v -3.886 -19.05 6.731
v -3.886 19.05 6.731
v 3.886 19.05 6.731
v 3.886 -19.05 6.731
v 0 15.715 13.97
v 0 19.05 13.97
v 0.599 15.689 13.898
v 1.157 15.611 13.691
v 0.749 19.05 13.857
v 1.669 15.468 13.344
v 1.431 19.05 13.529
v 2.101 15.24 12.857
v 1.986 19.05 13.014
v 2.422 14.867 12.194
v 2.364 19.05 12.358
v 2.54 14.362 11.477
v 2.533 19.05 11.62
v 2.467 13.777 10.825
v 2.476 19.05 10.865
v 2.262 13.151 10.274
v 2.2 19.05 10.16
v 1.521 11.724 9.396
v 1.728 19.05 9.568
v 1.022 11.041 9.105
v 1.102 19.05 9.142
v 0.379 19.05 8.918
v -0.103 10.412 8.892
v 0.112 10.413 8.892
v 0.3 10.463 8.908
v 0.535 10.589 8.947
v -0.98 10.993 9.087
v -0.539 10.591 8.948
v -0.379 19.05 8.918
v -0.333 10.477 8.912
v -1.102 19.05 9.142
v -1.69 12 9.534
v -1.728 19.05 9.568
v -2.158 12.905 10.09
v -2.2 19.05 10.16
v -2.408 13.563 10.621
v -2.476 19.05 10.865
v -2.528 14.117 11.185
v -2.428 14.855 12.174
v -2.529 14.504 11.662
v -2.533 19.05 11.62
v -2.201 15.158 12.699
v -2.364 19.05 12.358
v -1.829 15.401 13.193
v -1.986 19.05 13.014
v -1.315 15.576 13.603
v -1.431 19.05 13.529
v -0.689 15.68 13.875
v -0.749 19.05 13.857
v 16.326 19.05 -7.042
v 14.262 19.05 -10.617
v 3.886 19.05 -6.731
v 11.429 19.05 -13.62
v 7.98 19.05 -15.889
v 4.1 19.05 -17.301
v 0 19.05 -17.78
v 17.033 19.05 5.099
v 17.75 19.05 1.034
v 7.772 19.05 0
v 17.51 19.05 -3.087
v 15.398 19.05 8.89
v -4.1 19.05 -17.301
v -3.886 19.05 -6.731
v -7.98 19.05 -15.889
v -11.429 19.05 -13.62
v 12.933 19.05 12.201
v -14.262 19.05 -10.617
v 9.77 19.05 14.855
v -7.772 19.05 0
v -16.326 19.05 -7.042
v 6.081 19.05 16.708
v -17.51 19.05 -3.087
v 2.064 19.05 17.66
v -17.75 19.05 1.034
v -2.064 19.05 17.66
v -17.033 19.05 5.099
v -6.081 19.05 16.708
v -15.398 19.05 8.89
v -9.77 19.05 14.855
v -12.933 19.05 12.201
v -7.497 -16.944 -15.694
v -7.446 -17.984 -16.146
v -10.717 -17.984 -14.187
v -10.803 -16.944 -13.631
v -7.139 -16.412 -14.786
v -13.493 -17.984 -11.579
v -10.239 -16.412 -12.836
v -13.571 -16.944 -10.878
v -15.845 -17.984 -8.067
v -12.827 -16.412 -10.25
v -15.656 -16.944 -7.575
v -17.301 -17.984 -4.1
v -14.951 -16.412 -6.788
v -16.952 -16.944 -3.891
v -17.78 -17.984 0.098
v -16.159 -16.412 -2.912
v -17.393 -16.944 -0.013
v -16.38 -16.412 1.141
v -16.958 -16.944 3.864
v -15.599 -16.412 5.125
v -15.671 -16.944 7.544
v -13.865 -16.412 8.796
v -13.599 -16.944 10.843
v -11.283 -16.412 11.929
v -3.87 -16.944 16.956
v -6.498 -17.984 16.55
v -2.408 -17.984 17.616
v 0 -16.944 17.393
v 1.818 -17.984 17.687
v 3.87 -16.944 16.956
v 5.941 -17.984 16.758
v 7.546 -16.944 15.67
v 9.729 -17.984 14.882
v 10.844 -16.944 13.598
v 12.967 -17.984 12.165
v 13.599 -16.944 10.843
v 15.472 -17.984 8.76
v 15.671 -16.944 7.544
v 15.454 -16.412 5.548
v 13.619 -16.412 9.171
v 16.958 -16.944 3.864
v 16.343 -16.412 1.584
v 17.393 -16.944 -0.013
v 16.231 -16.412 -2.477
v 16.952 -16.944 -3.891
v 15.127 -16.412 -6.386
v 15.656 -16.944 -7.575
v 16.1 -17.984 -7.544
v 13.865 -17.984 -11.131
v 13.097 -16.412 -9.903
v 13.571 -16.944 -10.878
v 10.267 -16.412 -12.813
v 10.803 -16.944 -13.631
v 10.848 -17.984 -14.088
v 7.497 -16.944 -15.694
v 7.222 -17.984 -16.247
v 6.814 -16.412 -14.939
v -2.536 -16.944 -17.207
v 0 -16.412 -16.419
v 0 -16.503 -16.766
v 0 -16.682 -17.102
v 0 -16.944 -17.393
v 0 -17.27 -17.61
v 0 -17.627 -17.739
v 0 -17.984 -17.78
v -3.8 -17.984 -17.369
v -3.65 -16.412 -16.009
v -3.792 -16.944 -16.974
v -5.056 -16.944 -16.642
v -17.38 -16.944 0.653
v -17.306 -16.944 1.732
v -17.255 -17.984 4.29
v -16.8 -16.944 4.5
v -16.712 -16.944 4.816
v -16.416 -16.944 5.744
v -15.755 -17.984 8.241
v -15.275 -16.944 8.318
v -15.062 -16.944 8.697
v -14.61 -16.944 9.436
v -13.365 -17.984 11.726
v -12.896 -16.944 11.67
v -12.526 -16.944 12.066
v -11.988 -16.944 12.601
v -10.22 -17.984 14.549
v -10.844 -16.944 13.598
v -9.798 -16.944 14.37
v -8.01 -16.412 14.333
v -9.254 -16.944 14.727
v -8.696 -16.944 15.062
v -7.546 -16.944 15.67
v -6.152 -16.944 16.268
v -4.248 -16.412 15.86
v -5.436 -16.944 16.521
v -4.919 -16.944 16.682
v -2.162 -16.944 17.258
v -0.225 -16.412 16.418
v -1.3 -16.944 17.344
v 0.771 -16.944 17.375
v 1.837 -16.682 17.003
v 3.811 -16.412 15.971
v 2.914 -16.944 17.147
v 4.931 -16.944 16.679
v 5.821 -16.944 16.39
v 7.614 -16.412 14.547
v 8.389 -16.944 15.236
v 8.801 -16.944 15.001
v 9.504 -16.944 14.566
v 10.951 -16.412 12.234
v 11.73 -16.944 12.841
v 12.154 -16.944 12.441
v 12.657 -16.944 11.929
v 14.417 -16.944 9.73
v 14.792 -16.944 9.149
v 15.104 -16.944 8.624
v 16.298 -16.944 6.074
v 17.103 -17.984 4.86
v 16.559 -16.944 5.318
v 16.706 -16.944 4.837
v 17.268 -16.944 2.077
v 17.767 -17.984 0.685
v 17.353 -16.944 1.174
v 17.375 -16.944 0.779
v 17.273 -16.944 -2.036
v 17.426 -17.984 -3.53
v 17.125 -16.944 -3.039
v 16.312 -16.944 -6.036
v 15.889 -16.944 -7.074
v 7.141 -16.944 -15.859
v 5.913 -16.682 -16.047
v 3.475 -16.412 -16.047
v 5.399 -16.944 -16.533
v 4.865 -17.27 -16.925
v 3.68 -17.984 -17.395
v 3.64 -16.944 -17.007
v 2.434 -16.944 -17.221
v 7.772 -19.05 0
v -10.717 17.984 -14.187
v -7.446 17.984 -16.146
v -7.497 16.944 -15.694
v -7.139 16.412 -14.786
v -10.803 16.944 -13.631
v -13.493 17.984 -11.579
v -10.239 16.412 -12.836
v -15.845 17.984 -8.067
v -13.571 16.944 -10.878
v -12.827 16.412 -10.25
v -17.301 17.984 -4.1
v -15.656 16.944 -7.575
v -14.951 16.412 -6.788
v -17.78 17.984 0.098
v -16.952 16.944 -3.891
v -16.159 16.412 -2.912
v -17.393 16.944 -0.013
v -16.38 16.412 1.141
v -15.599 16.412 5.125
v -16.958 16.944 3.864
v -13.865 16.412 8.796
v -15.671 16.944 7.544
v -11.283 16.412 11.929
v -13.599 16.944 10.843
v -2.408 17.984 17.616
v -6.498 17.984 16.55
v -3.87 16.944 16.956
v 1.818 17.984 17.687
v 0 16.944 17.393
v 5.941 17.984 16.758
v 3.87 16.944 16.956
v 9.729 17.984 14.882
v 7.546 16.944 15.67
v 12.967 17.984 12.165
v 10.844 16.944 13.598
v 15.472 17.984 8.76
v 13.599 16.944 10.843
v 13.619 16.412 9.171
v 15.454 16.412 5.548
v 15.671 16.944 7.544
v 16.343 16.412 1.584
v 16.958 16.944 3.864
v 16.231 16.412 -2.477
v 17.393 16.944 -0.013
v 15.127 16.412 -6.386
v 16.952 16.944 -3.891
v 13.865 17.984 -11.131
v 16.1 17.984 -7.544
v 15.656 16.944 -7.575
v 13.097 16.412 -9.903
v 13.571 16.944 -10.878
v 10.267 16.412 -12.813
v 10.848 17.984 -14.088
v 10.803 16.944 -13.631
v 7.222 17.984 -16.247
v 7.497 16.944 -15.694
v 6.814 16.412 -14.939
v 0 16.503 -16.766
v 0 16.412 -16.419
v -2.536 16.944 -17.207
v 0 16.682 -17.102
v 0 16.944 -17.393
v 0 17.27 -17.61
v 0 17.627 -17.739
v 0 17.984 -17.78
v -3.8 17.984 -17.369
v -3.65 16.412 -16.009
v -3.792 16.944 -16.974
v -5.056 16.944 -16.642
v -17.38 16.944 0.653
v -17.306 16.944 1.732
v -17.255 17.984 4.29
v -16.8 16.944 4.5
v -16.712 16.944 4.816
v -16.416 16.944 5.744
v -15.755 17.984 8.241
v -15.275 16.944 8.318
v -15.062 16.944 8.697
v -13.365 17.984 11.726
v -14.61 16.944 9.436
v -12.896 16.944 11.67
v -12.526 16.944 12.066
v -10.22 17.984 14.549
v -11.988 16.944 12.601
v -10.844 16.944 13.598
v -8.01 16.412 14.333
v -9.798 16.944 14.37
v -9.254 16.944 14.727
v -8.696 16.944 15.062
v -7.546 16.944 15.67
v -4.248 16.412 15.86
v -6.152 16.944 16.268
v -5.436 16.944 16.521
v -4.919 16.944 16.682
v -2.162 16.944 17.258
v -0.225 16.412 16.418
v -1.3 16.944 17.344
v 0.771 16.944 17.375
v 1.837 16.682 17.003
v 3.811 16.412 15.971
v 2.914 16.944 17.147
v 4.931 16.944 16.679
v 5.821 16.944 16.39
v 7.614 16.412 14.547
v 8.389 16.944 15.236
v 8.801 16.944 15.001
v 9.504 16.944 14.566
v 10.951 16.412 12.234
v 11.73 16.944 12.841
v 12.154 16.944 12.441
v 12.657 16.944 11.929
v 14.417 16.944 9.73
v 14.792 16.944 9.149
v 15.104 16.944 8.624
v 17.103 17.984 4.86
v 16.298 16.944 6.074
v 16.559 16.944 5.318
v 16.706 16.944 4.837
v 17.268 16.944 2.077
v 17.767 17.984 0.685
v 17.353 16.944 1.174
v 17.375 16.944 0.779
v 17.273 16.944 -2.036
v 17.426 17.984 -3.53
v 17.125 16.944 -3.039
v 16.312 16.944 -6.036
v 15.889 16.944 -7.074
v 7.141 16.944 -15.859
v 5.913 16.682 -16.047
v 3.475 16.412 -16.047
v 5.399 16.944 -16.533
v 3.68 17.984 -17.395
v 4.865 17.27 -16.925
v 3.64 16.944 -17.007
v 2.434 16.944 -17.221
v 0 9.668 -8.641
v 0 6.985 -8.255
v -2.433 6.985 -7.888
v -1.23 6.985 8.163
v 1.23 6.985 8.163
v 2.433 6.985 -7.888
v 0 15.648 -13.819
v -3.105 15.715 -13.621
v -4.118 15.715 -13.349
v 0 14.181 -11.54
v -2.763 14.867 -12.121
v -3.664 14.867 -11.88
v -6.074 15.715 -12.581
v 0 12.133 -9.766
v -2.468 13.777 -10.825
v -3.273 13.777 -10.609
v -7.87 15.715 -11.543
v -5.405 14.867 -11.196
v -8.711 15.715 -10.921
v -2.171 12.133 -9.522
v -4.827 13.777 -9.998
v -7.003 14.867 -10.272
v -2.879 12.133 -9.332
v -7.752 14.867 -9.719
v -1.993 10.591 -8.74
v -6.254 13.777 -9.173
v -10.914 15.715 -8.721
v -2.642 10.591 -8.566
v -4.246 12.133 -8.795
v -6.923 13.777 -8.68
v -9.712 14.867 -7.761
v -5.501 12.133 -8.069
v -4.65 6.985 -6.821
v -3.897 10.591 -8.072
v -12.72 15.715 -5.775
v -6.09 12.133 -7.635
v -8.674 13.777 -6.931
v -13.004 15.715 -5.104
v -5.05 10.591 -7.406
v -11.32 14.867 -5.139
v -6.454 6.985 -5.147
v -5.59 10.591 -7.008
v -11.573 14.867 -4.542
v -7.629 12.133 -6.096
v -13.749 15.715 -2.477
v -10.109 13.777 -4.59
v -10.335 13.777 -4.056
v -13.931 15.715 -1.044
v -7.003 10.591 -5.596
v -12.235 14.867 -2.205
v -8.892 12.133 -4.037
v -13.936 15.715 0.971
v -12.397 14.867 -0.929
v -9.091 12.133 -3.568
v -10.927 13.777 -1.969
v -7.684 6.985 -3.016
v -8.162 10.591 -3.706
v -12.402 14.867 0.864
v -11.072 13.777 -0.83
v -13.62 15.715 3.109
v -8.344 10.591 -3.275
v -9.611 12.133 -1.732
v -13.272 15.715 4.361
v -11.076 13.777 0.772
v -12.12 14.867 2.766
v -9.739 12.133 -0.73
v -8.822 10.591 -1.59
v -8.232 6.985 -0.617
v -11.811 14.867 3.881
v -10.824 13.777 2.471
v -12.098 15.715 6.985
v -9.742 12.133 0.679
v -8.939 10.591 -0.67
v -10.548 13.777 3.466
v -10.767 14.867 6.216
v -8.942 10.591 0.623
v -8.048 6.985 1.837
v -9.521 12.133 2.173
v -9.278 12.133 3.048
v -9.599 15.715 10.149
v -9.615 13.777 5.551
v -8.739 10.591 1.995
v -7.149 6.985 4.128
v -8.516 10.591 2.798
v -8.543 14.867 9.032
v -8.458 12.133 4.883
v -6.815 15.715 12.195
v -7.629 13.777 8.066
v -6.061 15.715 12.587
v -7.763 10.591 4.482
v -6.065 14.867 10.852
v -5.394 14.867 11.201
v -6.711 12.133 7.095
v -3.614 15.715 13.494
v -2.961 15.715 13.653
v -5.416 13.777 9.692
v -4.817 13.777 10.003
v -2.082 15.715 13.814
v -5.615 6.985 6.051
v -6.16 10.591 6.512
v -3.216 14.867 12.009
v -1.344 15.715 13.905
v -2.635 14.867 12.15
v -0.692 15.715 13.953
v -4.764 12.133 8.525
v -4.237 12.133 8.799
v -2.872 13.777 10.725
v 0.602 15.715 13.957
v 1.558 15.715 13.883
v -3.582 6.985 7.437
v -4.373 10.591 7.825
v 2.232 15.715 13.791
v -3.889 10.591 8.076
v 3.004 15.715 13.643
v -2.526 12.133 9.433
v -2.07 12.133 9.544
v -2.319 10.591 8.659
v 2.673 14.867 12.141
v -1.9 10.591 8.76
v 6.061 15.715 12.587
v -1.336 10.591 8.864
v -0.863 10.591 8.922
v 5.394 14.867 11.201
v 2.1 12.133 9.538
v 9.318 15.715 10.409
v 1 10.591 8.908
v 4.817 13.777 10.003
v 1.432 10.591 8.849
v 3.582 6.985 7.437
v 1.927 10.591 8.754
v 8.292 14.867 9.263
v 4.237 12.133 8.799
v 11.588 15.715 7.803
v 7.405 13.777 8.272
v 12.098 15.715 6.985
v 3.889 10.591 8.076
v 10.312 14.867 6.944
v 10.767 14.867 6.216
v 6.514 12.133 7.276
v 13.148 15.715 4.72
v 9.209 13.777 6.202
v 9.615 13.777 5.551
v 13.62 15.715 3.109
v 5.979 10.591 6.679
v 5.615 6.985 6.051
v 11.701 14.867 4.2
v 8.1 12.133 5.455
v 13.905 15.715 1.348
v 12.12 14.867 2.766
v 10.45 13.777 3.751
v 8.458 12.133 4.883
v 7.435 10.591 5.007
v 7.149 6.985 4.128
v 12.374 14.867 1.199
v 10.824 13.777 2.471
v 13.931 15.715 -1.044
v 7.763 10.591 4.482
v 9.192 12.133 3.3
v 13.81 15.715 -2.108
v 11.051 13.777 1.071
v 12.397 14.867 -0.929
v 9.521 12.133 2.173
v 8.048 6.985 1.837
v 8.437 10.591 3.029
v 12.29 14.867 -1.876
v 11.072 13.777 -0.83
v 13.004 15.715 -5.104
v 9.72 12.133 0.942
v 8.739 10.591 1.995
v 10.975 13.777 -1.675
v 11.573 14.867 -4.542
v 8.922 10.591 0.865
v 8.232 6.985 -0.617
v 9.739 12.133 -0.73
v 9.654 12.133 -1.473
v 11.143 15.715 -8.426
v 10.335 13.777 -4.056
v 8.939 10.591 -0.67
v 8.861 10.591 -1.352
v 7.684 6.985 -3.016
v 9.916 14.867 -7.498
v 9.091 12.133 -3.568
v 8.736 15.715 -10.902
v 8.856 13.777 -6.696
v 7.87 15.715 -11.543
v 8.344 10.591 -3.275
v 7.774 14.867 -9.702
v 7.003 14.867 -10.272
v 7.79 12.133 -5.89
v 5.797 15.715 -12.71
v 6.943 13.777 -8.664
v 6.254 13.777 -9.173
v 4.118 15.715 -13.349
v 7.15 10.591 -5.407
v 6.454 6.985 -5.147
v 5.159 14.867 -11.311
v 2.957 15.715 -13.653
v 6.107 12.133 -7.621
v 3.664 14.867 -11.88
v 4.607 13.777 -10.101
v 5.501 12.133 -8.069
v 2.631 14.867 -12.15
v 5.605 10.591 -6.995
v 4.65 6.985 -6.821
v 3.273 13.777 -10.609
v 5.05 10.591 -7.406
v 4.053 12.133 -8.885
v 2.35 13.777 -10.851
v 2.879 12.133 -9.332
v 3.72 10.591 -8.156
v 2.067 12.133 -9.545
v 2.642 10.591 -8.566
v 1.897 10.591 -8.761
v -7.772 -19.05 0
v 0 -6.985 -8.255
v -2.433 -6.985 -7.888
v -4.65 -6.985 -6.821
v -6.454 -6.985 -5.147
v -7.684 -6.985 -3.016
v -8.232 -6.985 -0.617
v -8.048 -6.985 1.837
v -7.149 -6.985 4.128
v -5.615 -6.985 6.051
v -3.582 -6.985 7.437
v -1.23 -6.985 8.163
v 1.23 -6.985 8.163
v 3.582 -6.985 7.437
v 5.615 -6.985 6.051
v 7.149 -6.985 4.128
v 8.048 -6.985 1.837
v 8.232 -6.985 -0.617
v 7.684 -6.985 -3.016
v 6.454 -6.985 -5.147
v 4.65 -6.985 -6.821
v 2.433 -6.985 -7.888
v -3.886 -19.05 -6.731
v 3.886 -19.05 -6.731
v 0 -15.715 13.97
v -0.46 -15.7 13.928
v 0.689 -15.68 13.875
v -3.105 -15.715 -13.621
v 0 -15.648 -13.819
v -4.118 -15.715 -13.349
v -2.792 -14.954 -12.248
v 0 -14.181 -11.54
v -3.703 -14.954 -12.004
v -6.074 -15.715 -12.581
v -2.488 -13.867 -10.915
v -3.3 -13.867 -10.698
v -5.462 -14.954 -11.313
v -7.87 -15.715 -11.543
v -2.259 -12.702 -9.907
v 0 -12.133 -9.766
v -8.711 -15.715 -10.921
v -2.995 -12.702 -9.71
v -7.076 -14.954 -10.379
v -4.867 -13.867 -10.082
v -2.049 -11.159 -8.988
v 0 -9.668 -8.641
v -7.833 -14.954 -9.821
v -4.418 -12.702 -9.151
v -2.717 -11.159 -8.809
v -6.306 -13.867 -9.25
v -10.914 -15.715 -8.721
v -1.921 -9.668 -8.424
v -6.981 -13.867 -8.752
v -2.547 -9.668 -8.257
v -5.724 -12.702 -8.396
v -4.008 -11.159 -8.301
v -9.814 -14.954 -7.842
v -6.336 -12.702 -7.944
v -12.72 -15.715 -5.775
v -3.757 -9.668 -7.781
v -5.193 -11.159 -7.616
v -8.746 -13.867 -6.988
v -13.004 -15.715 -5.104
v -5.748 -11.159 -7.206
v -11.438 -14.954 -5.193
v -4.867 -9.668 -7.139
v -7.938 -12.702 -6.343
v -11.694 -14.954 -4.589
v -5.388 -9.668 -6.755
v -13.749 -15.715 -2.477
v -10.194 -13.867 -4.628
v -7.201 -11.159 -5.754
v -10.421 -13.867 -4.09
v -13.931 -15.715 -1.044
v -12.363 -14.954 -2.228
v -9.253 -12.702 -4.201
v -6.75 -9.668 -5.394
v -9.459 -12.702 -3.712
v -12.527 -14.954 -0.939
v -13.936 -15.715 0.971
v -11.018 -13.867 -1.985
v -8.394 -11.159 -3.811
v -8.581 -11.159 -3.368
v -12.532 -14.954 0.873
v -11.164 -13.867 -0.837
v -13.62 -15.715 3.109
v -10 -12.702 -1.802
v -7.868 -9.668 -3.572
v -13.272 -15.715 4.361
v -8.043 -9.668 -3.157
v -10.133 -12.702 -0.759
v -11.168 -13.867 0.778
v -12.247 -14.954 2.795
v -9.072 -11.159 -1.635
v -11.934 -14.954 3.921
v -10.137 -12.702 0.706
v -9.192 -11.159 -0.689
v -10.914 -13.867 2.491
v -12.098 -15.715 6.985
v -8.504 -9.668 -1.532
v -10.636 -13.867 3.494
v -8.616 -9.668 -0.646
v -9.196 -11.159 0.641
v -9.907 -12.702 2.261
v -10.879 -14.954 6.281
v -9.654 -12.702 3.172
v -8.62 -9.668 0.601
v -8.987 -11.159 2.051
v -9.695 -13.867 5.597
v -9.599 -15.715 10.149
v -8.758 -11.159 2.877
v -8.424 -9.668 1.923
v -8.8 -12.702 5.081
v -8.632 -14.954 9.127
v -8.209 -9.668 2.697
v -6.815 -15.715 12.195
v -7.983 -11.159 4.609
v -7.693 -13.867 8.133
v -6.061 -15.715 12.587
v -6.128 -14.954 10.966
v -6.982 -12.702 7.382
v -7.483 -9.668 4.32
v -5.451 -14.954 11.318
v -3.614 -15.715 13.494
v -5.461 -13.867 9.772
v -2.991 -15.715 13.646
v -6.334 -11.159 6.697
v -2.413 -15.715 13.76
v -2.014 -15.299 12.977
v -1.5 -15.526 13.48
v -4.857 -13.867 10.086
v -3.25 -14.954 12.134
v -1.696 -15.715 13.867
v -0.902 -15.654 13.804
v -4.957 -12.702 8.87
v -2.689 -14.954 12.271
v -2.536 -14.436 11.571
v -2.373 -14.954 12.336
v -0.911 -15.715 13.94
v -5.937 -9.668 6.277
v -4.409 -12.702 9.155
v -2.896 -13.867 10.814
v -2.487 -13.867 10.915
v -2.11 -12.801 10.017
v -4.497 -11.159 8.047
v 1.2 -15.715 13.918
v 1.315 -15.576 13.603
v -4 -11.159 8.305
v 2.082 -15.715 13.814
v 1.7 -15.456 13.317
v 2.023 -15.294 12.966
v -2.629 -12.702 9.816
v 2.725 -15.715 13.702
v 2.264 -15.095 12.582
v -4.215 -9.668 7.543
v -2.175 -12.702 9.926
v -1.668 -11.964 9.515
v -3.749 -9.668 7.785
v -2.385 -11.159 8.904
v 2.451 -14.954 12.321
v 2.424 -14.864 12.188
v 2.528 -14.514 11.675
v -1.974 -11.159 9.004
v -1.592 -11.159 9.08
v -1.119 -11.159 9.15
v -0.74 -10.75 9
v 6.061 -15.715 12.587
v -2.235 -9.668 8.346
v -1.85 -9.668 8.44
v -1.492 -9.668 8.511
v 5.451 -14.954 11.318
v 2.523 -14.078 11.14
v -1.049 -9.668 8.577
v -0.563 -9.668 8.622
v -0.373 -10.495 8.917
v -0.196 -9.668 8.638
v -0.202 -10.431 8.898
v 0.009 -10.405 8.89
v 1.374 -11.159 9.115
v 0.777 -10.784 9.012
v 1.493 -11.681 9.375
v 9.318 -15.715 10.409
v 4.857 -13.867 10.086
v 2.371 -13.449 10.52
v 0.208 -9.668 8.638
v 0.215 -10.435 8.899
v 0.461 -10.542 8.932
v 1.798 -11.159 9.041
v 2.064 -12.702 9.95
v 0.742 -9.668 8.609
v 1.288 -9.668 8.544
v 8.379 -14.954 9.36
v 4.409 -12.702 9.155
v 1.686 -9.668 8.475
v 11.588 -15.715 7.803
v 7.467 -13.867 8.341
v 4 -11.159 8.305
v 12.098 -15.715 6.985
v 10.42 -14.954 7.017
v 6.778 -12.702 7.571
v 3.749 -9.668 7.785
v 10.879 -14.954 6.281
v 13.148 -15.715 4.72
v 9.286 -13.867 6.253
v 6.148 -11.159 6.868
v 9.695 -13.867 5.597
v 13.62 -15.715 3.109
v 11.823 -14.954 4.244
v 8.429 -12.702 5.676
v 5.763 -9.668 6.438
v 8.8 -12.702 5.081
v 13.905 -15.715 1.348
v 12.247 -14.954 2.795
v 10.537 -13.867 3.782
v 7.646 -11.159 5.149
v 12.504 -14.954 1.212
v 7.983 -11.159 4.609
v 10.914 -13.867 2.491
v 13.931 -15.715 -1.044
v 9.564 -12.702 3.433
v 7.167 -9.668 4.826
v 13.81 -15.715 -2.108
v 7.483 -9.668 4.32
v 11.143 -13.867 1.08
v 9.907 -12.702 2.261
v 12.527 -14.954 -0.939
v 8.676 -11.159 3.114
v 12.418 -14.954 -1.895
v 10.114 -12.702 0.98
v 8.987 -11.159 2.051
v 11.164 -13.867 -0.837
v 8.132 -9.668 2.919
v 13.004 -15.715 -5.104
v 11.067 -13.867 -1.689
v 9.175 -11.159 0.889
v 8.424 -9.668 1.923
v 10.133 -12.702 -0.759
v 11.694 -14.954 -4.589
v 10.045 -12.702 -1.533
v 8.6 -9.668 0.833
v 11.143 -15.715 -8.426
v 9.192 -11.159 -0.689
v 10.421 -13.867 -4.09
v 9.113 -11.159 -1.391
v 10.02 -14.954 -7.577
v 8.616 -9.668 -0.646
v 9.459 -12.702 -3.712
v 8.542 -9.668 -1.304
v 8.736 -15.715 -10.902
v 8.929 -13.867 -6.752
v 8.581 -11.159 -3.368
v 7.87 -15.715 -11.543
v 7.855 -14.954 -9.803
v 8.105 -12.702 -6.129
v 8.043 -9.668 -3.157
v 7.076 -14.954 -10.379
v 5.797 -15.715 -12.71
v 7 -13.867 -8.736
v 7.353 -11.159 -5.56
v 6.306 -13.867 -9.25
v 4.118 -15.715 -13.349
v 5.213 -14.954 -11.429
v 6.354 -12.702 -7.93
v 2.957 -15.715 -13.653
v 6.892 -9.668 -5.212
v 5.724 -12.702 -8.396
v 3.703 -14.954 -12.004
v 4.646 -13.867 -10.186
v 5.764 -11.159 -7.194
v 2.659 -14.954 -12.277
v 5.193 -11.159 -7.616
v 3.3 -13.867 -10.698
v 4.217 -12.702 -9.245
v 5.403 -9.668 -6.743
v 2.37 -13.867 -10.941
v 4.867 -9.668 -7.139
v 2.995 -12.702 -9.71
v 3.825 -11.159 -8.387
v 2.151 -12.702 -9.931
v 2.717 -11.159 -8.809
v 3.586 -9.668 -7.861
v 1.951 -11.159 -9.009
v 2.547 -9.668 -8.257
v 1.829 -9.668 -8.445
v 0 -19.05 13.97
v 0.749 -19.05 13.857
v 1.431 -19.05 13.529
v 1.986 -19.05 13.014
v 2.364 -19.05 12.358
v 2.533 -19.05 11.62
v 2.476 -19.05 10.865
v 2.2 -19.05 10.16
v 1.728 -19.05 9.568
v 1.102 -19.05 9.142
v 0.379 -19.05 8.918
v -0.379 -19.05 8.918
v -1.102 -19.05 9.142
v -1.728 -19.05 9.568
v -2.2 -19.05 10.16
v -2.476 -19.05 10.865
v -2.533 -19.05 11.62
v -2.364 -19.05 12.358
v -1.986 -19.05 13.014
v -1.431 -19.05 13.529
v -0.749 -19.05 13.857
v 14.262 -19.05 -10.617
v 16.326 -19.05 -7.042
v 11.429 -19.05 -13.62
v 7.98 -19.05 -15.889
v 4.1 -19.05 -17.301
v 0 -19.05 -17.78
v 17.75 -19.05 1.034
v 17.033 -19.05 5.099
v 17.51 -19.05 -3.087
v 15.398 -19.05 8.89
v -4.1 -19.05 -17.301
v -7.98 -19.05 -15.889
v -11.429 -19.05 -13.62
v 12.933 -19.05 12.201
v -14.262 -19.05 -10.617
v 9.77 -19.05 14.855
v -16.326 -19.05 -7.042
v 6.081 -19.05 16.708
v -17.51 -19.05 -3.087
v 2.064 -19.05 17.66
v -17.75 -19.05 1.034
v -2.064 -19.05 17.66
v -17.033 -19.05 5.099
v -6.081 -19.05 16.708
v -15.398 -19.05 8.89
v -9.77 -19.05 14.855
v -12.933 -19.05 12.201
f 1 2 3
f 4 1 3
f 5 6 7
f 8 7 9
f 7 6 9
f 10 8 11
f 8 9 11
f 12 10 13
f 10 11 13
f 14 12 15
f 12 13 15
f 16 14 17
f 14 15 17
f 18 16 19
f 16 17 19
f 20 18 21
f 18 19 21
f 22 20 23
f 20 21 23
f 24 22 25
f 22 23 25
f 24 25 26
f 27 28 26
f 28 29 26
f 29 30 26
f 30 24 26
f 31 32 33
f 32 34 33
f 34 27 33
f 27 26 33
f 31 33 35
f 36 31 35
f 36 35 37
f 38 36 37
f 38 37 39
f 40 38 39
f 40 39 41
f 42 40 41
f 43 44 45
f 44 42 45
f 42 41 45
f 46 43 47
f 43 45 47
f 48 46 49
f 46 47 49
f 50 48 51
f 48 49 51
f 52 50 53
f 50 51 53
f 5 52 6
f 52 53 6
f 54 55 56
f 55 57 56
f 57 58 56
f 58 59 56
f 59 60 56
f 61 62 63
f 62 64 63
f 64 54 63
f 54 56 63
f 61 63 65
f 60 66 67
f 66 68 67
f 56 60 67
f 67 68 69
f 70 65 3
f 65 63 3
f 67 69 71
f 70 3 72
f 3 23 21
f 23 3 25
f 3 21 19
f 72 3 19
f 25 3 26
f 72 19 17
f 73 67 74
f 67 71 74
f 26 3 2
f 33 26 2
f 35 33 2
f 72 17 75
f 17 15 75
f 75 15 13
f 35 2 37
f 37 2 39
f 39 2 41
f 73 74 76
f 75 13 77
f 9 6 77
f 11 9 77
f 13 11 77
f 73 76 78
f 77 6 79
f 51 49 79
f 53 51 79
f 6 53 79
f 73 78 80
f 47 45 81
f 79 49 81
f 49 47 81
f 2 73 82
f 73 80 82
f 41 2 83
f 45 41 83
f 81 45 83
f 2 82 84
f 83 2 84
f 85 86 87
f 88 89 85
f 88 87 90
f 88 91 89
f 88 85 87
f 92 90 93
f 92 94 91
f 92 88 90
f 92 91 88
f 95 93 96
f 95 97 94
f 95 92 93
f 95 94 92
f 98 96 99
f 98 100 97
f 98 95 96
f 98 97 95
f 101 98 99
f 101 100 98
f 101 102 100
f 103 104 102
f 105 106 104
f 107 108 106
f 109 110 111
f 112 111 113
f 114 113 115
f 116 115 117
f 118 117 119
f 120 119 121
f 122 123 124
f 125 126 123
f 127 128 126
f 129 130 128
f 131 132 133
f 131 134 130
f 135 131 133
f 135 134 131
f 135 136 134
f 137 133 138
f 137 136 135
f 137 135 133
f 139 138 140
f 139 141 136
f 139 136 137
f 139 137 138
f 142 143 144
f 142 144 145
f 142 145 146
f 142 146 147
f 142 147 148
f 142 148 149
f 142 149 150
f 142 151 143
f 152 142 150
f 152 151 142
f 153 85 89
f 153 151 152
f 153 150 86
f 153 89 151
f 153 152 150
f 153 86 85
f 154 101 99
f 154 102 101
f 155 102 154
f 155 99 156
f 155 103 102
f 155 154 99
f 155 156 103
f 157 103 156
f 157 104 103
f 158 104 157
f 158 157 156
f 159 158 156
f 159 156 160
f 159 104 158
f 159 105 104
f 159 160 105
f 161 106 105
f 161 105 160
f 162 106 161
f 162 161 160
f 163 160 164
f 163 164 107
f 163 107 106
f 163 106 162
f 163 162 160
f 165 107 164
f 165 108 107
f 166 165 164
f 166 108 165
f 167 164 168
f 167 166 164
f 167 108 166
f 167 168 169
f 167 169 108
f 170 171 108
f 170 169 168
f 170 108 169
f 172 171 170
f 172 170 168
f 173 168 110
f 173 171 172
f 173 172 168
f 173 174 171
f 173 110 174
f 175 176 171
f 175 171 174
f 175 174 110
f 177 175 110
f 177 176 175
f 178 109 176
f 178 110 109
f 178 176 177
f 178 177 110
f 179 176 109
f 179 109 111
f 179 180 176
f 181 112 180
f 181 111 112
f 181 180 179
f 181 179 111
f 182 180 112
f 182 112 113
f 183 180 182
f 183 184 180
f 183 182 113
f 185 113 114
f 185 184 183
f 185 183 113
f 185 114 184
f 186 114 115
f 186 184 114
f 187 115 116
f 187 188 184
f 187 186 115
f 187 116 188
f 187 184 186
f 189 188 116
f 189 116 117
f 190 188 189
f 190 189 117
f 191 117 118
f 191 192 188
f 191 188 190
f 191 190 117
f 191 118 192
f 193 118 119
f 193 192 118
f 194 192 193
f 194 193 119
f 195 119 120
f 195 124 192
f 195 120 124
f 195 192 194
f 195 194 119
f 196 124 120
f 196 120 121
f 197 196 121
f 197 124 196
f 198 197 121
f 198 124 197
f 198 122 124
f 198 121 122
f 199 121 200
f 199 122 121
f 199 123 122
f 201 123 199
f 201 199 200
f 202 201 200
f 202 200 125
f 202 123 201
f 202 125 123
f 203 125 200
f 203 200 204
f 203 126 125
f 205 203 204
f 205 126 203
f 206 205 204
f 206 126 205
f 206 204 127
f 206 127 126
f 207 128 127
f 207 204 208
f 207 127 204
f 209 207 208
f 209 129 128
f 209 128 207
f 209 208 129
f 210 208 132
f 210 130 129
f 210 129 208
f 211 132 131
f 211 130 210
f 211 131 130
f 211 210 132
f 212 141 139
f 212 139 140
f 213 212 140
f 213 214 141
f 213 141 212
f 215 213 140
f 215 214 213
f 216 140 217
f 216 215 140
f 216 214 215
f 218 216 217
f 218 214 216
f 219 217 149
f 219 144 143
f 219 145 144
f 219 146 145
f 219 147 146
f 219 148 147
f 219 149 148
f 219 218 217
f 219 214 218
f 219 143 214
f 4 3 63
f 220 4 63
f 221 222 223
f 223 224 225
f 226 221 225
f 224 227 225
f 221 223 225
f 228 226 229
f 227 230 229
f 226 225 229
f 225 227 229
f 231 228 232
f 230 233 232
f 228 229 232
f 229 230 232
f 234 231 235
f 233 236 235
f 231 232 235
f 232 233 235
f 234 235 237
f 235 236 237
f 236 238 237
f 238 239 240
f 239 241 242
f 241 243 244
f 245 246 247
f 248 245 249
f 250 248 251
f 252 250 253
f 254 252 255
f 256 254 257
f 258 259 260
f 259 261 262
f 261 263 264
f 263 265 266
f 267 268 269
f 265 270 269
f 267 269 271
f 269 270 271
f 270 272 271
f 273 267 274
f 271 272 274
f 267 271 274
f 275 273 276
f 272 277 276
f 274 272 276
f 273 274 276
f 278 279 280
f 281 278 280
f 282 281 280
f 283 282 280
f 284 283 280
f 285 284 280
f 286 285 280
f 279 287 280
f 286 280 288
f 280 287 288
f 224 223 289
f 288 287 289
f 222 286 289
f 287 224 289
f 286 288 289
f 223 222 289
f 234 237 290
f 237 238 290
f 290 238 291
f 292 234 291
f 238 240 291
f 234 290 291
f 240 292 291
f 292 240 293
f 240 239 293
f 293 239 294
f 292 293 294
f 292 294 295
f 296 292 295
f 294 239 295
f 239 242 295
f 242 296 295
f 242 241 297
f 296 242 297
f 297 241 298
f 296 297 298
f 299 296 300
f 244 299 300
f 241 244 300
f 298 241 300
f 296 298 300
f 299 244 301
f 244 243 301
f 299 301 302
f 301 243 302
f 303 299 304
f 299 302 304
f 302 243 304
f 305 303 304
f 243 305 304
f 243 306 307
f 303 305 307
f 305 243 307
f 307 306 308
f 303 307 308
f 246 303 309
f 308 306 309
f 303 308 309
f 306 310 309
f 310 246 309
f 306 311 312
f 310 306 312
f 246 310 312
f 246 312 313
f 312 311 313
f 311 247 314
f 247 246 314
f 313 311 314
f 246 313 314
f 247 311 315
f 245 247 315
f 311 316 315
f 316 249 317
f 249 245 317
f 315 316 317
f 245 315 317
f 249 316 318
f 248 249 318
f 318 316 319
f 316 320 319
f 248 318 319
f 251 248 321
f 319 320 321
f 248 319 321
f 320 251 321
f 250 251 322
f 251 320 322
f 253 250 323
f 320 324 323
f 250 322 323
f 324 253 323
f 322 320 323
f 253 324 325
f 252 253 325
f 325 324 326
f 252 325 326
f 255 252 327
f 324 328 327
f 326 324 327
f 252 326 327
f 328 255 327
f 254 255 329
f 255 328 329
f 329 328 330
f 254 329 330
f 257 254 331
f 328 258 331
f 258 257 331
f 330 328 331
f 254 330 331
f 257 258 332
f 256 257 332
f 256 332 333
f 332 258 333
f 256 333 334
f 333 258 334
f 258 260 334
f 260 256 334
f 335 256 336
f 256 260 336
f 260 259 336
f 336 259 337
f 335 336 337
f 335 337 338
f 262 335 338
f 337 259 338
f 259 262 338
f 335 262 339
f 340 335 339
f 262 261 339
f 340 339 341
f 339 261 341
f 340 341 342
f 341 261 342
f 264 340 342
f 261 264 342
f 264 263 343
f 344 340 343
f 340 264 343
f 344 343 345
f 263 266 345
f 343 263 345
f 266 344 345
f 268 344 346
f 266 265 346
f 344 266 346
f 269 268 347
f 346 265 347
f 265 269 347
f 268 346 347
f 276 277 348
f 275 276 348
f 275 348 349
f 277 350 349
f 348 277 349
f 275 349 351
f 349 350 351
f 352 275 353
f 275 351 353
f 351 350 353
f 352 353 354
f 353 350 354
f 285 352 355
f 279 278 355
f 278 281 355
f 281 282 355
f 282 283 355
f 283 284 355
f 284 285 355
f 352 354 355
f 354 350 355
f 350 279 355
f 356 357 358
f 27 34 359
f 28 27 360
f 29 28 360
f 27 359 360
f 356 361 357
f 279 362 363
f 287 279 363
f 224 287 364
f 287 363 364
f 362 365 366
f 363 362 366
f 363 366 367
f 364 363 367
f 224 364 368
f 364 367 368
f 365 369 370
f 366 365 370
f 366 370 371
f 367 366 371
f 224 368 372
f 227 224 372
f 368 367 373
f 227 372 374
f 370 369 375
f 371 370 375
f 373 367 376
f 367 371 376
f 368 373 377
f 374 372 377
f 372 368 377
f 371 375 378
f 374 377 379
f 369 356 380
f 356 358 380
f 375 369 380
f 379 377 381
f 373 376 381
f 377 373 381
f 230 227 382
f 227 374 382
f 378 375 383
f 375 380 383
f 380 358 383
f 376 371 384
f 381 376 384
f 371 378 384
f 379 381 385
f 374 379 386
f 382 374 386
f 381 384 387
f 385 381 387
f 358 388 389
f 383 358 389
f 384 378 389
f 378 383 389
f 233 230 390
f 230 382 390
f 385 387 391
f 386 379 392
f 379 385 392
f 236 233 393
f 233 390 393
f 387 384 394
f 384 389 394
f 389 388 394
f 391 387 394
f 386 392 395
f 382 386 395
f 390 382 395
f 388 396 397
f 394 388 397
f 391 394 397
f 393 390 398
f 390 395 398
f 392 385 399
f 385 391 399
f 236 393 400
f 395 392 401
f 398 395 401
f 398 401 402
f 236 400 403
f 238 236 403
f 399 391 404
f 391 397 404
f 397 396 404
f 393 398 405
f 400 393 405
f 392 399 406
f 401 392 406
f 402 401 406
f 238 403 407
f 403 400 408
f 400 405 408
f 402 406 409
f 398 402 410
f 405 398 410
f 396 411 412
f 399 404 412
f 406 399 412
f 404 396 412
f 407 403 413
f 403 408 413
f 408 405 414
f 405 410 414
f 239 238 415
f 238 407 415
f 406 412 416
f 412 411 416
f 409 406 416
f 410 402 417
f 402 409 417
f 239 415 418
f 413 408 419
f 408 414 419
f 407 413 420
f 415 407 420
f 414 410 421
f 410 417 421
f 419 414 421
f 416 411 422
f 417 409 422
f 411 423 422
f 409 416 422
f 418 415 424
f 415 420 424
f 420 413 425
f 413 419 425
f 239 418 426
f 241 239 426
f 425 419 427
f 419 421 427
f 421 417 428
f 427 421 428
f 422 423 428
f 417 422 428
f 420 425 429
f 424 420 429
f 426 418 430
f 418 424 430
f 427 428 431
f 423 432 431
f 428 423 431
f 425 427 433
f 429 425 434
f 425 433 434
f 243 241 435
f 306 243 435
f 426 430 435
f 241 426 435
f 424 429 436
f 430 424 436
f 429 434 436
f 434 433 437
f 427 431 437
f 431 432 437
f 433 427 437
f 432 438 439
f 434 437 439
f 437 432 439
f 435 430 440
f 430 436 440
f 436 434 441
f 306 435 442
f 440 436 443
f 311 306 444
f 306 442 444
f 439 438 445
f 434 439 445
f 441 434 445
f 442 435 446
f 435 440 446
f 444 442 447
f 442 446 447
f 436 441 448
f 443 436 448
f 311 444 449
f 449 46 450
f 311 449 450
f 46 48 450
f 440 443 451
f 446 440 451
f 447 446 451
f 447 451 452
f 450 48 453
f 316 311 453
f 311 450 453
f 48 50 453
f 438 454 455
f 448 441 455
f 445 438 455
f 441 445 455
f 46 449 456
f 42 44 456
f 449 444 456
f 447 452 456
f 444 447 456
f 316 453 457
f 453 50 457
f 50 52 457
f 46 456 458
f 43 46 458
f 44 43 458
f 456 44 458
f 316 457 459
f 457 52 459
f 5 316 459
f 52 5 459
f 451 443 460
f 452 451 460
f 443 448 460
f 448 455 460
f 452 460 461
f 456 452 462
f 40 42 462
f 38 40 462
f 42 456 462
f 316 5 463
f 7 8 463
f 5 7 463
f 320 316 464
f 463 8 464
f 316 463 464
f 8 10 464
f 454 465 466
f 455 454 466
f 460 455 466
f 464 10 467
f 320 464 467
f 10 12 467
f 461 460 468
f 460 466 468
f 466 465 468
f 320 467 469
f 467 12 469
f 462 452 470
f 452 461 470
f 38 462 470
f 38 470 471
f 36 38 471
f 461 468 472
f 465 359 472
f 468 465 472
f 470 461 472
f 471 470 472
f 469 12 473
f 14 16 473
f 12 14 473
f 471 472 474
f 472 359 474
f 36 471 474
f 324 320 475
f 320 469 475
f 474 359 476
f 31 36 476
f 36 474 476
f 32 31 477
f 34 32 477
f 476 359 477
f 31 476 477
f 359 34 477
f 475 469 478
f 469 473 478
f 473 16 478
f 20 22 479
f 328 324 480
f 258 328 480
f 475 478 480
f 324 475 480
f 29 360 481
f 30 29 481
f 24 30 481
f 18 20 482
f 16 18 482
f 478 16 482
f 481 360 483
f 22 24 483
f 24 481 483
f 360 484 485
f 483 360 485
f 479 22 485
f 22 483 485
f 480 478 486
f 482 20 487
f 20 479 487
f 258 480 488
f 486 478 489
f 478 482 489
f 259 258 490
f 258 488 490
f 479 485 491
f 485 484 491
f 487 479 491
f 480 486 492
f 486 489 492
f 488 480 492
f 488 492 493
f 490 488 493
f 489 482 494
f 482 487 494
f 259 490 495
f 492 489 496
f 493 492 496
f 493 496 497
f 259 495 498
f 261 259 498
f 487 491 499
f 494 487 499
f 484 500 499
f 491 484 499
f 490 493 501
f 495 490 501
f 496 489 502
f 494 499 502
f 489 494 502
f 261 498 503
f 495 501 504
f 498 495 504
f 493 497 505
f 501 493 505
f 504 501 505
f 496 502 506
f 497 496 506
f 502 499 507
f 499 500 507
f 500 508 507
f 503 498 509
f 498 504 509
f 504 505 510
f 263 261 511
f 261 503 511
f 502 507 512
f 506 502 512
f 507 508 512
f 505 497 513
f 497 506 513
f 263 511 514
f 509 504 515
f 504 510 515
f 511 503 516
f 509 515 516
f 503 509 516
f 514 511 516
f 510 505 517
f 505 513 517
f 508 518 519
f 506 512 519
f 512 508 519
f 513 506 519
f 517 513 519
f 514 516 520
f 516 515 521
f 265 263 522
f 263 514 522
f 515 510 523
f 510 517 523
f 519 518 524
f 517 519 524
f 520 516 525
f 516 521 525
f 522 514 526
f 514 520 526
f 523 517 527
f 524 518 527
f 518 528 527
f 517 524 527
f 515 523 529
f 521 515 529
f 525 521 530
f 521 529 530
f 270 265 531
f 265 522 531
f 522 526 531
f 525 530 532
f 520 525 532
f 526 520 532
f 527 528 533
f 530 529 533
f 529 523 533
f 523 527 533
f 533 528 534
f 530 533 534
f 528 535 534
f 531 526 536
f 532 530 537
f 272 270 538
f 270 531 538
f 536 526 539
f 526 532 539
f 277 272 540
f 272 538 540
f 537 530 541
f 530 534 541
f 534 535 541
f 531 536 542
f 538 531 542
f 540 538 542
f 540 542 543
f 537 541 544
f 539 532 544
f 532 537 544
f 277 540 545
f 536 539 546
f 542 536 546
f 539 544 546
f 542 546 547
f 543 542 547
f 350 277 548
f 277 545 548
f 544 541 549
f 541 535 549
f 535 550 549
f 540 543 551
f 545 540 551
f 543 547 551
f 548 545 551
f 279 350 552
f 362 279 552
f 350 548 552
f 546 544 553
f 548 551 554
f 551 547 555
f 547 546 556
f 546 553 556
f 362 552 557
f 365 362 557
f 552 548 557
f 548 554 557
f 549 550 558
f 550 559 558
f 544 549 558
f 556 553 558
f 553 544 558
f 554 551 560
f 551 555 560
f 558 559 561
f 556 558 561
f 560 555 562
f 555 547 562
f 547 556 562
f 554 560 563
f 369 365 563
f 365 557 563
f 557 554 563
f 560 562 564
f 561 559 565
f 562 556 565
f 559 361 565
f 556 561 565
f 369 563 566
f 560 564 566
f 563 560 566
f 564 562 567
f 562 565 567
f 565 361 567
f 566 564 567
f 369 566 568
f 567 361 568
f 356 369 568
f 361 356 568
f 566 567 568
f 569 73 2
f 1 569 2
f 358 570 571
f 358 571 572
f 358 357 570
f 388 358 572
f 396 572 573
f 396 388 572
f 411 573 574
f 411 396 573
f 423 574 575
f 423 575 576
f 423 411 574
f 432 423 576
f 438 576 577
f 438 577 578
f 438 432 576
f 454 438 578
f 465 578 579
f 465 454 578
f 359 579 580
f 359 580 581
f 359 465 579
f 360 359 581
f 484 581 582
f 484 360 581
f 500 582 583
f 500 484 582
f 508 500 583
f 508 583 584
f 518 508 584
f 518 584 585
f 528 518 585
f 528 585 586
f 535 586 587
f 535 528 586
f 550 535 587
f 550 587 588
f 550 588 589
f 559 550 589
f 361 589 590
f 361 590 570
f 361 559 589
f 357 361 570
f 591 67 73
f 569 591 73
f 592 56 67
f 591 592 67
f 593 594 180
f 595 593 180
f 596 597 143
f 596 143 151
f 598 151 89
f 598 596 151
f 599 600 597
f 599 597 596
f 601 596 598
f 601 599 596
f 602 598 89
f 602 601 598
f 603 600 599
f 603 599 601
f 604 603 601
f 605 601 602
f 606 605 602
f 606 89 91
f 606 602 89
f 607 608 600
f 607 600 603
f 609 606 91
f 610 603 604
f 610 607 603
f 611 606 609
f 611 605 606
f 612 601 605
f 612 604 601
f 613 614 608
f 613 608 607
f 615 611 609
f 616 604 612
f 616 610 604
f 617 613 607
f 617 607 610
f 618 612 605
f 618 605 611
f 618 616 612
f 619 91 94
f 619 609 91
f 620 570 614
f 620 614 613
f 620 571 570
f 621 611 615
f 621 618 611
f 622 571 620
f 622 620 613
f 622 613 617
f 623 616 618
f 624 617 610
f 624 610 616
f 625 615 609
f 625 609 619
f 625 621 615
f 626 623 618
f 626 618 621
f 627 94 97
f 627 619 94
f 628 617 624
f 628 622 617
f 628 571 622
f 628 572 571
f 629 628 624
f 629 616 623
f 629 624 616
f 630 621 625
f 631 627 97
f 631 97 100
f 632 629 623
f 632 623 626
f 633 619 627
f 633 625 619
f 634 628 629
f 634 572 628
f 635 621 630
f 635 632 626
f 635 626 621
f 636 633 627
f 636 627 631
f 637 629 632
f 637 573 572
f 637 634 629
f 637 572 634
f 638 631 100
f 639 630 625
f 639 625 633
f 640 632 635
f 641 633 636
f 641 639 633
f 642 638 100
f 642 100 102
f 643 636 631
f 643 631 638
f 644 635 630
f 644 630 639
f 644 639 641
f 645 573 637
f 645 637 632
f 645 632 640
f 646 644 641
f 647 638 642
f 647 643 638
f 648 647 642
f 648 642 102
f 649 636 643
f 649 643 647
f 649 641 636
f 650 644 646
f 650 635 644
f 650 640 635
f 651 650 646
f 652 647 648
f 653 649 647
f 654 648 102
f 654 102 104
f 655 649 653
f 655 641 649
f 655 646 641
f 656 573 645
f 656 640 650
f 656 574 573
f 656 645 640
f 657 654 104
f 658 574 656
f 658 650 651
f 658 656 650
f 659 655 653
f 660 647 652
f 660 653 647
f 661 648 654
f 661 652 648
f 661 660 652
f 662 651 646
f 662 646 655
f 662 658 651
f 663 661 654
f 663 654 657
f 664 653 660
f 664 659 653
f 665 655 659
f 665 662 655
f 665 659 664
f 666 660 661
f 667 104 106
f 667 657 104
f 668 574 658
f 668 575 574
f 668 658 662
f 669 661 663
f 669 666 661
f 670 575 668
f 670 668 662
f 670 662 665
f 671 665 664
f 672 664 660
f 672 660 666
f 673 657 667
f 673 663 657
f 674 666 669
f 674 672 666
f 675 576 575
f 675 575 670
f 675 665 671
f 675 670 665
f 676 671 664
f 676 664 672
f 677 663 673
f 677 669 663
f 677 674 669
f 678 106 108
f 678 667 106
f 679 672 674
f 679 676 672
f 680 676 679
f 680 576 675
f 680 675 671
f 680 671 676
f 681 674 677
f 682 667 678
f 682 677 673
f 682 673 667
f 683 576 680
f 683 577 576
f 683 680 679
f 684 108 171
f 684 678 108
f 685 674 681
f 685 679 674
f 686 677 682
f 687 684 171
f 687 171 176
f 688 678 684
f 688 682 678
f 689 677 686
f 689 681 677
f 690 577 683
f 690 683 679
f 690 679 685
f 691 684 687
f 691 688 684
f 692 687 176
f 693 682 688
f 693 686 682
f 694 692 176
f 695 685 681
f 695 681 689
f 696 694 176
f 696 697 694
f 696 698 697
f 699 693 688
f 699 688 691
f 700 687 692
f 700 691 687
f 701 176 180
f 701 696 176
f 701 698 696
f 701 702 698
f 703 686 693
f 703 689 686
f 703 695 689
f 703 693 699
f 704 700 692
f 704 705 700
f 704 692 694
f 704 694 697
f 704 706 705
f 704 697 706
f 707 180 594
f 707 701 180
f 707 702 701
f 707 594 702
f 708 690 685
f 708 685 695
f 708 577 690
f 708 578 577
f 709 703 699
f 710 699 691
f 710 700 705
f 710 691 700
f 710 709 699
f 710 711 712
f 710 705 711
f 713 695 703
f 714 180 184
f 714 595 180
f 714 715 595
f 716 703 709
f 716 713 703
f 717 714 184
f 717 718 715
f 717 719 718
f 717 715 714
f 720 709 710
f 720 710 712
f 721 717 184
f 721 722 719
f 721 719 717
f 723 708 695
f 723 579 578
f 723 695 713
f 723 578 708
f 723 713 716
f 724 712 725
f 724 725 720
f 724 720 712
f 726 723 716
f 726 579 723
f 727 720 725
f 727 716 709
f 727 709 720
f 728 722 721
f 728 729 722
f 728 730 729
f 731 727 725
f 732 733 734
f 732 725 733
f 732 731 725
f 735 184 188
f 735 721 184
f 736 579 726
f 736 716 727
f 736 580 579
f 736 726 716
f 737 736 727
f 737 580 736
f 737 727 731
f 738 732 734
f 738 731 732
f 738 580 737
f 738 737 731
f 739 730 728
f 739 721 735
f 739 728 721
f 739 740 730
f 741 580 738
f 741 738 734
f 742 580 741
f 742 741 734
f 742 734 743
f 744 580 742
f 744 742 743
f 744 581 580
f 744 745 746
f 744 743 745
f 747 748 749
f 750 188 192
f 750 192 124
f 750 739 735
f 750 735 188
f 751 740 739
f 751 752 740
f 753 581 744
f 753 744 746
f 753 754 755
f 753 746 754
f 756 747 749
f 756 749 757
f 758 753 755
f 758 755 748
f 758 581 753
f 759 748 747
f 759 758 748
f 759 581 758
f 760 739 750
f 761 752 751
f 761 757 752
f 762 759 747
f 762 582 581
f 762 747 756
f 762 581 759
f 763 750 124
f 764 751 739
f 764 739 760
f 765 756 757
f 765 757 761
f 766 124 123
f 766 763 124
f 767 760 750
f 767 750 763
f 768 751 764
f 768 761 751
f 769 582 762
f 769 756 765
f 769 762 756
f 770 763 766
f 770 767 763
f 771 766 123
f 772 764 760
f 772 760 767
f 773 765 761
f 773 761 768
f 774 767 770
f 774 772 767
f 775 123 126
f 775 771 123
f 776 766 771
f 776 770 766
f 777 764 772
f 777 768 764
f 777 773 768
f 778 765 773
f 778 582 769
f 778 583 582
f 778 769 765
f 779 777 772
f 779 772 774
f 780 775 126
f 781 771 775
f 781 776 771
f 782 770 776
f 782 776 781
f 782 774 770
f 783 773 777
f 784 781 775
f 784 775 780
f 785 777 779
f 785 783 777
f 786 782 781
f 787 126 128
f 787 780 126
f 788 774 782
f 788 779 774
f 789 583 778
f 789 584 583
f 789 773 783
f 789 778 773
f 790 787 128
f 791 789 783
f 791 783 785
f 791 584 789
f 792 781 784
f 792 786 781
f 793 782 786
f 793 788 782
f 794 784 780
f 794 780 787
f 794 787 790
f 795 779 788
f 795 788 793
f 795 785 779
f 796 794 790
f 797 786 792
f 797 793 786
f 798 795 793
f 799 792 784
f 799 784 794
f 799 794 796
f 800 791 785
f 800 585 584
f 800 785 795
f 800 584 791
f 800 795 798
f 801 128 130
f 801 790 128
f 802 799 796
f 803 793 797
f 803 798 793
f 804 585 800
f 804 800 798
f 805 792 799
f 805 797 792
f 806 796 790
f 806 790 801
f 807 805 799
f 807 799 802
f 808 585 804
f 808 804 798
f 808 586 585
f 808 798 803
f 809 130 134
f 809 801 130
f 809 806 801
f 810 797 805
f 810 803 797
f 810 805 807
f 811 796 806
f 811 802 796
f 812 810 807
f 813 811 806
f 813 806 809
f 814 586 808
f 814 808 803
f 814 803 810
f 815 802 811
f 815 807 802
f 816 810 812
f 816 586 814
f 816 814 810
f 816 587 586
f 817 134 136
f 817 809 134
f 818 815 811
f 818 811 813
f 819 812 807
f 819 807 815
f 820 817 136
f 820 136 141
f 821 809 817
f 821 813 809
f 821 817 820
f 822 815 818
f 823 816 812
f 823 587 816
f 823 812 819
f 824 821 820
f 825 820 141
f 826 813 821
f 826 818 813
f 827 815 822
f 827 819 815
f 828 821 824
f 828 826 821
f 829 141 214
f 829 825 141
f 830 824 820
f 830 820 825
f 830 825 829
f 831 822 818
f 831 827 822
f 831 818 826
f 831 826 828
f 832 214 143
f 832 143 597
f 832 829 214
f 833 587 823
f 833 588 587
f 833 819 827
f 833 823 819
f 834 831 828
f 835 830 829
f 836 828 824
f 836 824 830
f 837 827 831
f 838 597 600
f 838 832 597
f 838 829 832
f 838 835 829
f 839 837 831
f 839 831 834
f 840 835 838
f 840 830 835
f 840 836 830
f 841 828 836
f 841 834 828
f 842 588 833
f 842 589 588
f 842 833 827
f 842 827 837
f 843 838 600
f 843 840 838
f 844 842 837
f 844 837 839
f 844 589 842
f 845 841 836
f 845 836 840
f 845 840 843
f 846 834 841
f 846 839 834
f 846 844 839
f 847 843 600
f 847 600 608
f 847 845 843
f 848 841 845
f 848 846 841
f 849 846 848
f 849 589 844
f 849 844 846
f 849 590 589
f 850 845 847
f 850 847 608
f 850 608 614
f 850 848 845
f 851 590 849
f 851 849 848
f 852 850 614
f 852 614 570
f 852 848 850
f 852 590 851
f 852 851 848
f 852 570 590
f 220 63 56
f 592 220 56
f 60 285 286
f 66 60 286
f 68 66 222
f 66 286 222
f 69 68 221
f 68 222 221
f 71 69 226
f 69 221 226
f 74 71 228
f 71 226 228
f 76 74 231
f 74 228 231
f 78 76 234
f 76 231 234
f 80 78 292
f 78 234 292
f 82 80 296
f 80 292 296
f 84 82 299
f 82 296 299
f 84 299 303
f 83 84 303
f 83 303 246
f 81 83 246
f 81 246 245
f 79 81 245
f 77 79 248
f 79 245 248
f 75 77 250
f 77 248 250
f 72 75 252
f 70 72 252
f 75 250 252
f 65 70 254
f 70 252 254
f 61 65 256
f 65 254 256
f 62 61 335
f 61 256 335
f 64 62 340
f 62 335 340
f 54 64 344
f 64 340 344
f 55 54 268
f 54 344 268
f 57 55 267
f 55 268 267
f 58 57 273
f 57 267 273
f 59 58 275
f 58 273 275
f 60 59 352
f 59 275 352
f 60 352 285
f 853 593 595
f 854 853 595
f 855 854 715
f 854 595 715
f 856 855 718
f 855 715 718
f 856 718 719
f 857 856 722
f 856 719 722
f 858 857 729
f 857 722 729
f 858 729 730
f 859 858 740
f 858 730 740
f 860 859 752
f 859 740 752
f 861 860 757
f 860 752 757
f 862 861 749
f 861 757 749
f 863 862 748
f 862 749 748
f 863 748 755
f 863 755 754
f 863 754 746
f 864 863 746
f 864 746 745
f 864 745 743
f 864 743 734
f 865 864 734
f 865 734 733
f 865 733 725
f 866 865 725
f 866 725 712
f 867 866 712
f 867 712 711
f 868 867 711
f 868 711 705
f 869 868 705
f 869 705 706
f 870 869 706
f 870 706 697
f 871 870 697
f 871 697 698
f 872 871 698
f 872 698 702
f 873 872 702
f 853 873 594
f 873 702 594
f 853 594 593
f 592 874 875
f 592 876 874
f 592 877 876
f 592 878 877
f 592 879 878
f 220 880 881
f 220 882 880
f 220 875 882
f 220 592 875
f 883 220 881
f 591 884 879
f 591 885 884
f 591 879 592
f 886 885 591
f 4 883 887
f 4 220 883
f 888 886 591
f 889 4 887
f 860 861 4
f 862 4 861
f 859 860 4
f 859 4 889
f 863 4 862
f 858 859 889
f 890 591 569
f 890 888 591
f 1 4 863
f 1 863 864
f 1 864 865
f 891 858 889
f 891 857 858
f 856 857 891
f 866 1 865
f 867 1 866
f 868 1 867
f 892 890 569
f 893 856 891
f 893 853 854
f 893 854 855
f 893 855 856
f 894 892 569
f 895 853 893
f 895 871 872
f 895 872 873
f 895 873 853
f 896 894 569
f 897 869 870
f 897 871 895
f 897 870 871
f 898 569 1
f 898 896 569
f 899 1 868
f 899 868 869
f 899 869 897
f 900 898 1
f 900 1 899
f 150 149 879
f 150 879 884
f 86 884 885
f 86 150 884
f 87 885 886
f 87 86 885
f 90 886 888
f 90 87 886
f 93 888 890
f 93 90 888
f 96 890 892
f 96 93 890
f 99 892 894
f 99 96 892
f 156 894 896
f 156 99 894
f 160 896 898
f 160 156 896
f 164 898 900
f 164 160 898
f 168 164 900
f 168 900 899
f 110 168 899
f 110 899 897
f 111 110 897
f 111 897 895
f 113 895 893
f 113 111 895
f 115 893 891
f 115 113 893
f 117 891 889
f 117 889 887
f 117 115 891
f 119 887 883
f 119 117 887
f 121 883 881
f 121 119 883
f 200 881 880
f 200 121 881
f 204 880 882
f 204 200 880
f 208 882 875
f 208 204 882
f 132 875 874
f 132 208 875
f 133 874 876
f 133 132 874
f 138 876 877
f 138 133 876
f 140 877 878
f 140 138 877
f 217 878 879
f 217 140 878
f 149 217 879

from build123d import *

# Parameters (mm, degrees)
SKETCH2_R          = 2.54
CUT_EXTRUDE1_DEPTH = 46.649389919
FILLET1_R          = 1.5875


with BuildPart() as part:
    # Sketch1 → Revolve1 (revolve)
    with BuildSketch(Plane(origin=(0, 0, 0), x_dir=(0, 0, -1), z_dir=(1, 0, 0))):
        with BuildLine():
            Line((0, 0), (0, 19.05))
            Line((0, 19.05), (17.78, 19.05))
            Line((17.78, 19.05), (17.78, 16.51))
            ThreePointArc((17.78, 16.51), (11.044807909, 13.720192091), (8.255, 6.985))
            Line((8.255, 6.985), (8.255, 0))
            Line((8.255, 0), (0, 0))
        make_face()
    revolve1 = revolve(axis=Axis((0, 0, 0), (0, 1, 0)))

    # Mirror1: Revolve1 across plane
    add(revolve1.mirror(Plane(origin=(0, 0, -8.255), x_dir=(0, 0, 1), z_dir=(0, -1, 0))))

    # Sketch2 → Cut-Extrude1 (cut, through all)
    with BuildSketch(Plane(origin=(0, 19.05, 0), x_dir=(1, 0, 0), z_dir=(0, 1, 0))):
        with Locations(Location((0, -11.43, 0), (0, 0, 270))):
            Circle(SKETCH2_R)
        Polygon((-3.886144662, -6.731), (3.886144662, -6.731), (7.772289324, 0), (3.886144662, 6.731), (-3.886144662, 6.731), (-7.772289324, 0), align=None)
    extrude(amount=-CUT_EXTRUDE1_DEPTH, mode=Mode.SUBTRACT)

    # Fillet1
    fillet1_edges = [part.edges().sort_by_distance(p)[0] for p in [
        (0, -16.51, 17.78),
        (0, 16.51, 17.78),
    ]]
    fillet(fillet1_edges, radius=FILLET1_R)


solid = part.part
